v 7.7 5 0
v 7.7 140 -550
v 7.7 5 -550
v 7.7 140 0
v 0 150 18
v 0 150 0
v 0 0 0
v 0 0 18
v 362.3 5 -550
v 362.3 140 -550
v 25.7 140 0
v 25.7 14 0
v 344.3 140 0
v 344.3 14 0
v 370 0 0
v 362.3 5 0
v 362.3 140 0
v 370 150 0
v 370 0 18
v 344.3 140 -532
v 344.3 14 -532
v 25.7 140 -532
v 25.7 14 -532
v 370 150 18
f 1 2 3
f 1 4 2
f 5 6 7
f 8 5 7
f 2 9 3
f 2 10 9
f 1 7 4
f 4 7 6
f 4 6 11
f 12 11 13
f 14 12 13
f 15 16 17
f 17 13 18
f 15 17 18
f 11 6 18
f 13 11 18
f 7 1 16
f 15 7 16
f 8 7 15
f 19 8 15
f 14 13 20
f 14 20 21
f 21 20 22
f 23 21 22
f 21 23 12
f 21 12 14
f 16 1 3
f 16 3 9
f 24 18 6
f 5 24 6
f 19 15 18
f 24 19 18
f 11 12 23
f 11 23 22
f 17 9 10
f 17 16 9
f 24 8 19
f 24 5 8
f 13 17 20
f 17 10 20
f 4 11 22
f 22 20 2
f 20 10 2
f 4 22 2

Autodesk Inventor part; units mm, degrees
ref_plane "YZ Plane" through (0, 0, 0) normal (1, 0, 0) x (0, 1, 0)
ref_plane "XZ Plane" through (0, 0, 0) normal (0, 1, 0) x (-1, 0, 0)
ref_plane "XY Plane" through (0, 0, 0) normal (0, 0, 1) x (1, 0, 0)
sketch "Sketch5" plane through (0, 0, 0) normal (0, 0, 1) x (1, 0, 0)
  line L0 (0, 0) -> (370, 0)
  line L1 (370, 0) -> (370, 150)
  line L2 (370, 150) -> (0, 150)
  line L3 (0, 150) -> (0, 0)
  dimension "d15" = 370
  dimension "d16" = 150
extrude "Extrusion5" add sketch "Sketch5" along normal blind 18
sketch "Sketch6" plane through (0, 0, 0) normal (0, 0, -1) x (-1, 0, 0)
  line L0 (-362.3, 140) -> (-344.3, 140)
  line L1 (-344.3, 140) -> (-344.3, 5)
  line L2 (-344.3, 5) -> (-362.3, 5)
  line L3 (-362.3, 5) -> (-362.3, 140)
  line L4 (-370, 0) -> (-370, 150) projected
  line L5 (0, 0) -> (-370, 0) projected
  line L6 (-25.7, 140) -> (-7.7, 140)
  line L7 (-7.7, 140) -> (-7.7, 5)
  line L8 (-7.7, 5) -> (-25.7, 5)
  line L9 (-25.7, 5) -> (-25.7, 140)
  line L10 (0, 150) -> (0, 0) projected
  dimension "d19" = 18
  dimension "d20" = 135
  dimension "d21" = 7.7
  dimension "d22" = 5
  dimension "d23" = 18
  dimension "d24" = 7.7
  dimension "d25" = 5
extrude "Extrusion6" add sketch "Sketch6" along normal blind 550
sketch "Sketch7" plane through (0, 0, -550) normal (0, 0, -1) x (-1, 0, 0)
  line L0 (-344.3, 140) -> (-344.3, 5) projected
  line L1 (-25.7, 5) -> (-25.7, 140) projected
  line L2 (-344.3, 140) -> (-25.7, 140)
  line L3 (-25.7, 140) -> (-25.7, 5)
  line L4 (-25.7, 5) -> (-344.3, 5)
  line L5 (-344.3, 5) -> (-344.3, 140)
  point P0 (0, 0)
extrude "Extrusion7" add sketch "Sketch7" against normal blind 18
sketch "Sketch8" plane through (7.7, 5, -550) normal (0, -1, 0) x (1, 0, 0)
  line L0 (354.6, 550) -> (336.6, 550) projected
  line L1 (354.6, 550) -> (354.6, 0) projected
  line L2 (0, 0) -> (354.6, 0) projected
  line L3 (0, 550) -> (0, 0) projected
  line L4 (18, 550) -> (0, 550) projected
  line L5 (18, 550) -> (18, 18) projected
  line L6 (336.6, 18) -> (18, 18) projected
  line L7 (336.6, 550) -> (336.6, 18) projected
  line L8 (362.3, 550) -> (-7.7, 550) projected
extrude "Extrusion8" add sketch "Sketch8" against normal blind 9 contours L7 L6 L5 L8
equation "\"d16\" = Cajon02Altura"
equation "\"d24\" = d21"
equation "\"d25\" = d22"
equation "\"Cajon02Altura\" = 150"
properties part number "FrenteGrande" material "Wood (Birch)"
